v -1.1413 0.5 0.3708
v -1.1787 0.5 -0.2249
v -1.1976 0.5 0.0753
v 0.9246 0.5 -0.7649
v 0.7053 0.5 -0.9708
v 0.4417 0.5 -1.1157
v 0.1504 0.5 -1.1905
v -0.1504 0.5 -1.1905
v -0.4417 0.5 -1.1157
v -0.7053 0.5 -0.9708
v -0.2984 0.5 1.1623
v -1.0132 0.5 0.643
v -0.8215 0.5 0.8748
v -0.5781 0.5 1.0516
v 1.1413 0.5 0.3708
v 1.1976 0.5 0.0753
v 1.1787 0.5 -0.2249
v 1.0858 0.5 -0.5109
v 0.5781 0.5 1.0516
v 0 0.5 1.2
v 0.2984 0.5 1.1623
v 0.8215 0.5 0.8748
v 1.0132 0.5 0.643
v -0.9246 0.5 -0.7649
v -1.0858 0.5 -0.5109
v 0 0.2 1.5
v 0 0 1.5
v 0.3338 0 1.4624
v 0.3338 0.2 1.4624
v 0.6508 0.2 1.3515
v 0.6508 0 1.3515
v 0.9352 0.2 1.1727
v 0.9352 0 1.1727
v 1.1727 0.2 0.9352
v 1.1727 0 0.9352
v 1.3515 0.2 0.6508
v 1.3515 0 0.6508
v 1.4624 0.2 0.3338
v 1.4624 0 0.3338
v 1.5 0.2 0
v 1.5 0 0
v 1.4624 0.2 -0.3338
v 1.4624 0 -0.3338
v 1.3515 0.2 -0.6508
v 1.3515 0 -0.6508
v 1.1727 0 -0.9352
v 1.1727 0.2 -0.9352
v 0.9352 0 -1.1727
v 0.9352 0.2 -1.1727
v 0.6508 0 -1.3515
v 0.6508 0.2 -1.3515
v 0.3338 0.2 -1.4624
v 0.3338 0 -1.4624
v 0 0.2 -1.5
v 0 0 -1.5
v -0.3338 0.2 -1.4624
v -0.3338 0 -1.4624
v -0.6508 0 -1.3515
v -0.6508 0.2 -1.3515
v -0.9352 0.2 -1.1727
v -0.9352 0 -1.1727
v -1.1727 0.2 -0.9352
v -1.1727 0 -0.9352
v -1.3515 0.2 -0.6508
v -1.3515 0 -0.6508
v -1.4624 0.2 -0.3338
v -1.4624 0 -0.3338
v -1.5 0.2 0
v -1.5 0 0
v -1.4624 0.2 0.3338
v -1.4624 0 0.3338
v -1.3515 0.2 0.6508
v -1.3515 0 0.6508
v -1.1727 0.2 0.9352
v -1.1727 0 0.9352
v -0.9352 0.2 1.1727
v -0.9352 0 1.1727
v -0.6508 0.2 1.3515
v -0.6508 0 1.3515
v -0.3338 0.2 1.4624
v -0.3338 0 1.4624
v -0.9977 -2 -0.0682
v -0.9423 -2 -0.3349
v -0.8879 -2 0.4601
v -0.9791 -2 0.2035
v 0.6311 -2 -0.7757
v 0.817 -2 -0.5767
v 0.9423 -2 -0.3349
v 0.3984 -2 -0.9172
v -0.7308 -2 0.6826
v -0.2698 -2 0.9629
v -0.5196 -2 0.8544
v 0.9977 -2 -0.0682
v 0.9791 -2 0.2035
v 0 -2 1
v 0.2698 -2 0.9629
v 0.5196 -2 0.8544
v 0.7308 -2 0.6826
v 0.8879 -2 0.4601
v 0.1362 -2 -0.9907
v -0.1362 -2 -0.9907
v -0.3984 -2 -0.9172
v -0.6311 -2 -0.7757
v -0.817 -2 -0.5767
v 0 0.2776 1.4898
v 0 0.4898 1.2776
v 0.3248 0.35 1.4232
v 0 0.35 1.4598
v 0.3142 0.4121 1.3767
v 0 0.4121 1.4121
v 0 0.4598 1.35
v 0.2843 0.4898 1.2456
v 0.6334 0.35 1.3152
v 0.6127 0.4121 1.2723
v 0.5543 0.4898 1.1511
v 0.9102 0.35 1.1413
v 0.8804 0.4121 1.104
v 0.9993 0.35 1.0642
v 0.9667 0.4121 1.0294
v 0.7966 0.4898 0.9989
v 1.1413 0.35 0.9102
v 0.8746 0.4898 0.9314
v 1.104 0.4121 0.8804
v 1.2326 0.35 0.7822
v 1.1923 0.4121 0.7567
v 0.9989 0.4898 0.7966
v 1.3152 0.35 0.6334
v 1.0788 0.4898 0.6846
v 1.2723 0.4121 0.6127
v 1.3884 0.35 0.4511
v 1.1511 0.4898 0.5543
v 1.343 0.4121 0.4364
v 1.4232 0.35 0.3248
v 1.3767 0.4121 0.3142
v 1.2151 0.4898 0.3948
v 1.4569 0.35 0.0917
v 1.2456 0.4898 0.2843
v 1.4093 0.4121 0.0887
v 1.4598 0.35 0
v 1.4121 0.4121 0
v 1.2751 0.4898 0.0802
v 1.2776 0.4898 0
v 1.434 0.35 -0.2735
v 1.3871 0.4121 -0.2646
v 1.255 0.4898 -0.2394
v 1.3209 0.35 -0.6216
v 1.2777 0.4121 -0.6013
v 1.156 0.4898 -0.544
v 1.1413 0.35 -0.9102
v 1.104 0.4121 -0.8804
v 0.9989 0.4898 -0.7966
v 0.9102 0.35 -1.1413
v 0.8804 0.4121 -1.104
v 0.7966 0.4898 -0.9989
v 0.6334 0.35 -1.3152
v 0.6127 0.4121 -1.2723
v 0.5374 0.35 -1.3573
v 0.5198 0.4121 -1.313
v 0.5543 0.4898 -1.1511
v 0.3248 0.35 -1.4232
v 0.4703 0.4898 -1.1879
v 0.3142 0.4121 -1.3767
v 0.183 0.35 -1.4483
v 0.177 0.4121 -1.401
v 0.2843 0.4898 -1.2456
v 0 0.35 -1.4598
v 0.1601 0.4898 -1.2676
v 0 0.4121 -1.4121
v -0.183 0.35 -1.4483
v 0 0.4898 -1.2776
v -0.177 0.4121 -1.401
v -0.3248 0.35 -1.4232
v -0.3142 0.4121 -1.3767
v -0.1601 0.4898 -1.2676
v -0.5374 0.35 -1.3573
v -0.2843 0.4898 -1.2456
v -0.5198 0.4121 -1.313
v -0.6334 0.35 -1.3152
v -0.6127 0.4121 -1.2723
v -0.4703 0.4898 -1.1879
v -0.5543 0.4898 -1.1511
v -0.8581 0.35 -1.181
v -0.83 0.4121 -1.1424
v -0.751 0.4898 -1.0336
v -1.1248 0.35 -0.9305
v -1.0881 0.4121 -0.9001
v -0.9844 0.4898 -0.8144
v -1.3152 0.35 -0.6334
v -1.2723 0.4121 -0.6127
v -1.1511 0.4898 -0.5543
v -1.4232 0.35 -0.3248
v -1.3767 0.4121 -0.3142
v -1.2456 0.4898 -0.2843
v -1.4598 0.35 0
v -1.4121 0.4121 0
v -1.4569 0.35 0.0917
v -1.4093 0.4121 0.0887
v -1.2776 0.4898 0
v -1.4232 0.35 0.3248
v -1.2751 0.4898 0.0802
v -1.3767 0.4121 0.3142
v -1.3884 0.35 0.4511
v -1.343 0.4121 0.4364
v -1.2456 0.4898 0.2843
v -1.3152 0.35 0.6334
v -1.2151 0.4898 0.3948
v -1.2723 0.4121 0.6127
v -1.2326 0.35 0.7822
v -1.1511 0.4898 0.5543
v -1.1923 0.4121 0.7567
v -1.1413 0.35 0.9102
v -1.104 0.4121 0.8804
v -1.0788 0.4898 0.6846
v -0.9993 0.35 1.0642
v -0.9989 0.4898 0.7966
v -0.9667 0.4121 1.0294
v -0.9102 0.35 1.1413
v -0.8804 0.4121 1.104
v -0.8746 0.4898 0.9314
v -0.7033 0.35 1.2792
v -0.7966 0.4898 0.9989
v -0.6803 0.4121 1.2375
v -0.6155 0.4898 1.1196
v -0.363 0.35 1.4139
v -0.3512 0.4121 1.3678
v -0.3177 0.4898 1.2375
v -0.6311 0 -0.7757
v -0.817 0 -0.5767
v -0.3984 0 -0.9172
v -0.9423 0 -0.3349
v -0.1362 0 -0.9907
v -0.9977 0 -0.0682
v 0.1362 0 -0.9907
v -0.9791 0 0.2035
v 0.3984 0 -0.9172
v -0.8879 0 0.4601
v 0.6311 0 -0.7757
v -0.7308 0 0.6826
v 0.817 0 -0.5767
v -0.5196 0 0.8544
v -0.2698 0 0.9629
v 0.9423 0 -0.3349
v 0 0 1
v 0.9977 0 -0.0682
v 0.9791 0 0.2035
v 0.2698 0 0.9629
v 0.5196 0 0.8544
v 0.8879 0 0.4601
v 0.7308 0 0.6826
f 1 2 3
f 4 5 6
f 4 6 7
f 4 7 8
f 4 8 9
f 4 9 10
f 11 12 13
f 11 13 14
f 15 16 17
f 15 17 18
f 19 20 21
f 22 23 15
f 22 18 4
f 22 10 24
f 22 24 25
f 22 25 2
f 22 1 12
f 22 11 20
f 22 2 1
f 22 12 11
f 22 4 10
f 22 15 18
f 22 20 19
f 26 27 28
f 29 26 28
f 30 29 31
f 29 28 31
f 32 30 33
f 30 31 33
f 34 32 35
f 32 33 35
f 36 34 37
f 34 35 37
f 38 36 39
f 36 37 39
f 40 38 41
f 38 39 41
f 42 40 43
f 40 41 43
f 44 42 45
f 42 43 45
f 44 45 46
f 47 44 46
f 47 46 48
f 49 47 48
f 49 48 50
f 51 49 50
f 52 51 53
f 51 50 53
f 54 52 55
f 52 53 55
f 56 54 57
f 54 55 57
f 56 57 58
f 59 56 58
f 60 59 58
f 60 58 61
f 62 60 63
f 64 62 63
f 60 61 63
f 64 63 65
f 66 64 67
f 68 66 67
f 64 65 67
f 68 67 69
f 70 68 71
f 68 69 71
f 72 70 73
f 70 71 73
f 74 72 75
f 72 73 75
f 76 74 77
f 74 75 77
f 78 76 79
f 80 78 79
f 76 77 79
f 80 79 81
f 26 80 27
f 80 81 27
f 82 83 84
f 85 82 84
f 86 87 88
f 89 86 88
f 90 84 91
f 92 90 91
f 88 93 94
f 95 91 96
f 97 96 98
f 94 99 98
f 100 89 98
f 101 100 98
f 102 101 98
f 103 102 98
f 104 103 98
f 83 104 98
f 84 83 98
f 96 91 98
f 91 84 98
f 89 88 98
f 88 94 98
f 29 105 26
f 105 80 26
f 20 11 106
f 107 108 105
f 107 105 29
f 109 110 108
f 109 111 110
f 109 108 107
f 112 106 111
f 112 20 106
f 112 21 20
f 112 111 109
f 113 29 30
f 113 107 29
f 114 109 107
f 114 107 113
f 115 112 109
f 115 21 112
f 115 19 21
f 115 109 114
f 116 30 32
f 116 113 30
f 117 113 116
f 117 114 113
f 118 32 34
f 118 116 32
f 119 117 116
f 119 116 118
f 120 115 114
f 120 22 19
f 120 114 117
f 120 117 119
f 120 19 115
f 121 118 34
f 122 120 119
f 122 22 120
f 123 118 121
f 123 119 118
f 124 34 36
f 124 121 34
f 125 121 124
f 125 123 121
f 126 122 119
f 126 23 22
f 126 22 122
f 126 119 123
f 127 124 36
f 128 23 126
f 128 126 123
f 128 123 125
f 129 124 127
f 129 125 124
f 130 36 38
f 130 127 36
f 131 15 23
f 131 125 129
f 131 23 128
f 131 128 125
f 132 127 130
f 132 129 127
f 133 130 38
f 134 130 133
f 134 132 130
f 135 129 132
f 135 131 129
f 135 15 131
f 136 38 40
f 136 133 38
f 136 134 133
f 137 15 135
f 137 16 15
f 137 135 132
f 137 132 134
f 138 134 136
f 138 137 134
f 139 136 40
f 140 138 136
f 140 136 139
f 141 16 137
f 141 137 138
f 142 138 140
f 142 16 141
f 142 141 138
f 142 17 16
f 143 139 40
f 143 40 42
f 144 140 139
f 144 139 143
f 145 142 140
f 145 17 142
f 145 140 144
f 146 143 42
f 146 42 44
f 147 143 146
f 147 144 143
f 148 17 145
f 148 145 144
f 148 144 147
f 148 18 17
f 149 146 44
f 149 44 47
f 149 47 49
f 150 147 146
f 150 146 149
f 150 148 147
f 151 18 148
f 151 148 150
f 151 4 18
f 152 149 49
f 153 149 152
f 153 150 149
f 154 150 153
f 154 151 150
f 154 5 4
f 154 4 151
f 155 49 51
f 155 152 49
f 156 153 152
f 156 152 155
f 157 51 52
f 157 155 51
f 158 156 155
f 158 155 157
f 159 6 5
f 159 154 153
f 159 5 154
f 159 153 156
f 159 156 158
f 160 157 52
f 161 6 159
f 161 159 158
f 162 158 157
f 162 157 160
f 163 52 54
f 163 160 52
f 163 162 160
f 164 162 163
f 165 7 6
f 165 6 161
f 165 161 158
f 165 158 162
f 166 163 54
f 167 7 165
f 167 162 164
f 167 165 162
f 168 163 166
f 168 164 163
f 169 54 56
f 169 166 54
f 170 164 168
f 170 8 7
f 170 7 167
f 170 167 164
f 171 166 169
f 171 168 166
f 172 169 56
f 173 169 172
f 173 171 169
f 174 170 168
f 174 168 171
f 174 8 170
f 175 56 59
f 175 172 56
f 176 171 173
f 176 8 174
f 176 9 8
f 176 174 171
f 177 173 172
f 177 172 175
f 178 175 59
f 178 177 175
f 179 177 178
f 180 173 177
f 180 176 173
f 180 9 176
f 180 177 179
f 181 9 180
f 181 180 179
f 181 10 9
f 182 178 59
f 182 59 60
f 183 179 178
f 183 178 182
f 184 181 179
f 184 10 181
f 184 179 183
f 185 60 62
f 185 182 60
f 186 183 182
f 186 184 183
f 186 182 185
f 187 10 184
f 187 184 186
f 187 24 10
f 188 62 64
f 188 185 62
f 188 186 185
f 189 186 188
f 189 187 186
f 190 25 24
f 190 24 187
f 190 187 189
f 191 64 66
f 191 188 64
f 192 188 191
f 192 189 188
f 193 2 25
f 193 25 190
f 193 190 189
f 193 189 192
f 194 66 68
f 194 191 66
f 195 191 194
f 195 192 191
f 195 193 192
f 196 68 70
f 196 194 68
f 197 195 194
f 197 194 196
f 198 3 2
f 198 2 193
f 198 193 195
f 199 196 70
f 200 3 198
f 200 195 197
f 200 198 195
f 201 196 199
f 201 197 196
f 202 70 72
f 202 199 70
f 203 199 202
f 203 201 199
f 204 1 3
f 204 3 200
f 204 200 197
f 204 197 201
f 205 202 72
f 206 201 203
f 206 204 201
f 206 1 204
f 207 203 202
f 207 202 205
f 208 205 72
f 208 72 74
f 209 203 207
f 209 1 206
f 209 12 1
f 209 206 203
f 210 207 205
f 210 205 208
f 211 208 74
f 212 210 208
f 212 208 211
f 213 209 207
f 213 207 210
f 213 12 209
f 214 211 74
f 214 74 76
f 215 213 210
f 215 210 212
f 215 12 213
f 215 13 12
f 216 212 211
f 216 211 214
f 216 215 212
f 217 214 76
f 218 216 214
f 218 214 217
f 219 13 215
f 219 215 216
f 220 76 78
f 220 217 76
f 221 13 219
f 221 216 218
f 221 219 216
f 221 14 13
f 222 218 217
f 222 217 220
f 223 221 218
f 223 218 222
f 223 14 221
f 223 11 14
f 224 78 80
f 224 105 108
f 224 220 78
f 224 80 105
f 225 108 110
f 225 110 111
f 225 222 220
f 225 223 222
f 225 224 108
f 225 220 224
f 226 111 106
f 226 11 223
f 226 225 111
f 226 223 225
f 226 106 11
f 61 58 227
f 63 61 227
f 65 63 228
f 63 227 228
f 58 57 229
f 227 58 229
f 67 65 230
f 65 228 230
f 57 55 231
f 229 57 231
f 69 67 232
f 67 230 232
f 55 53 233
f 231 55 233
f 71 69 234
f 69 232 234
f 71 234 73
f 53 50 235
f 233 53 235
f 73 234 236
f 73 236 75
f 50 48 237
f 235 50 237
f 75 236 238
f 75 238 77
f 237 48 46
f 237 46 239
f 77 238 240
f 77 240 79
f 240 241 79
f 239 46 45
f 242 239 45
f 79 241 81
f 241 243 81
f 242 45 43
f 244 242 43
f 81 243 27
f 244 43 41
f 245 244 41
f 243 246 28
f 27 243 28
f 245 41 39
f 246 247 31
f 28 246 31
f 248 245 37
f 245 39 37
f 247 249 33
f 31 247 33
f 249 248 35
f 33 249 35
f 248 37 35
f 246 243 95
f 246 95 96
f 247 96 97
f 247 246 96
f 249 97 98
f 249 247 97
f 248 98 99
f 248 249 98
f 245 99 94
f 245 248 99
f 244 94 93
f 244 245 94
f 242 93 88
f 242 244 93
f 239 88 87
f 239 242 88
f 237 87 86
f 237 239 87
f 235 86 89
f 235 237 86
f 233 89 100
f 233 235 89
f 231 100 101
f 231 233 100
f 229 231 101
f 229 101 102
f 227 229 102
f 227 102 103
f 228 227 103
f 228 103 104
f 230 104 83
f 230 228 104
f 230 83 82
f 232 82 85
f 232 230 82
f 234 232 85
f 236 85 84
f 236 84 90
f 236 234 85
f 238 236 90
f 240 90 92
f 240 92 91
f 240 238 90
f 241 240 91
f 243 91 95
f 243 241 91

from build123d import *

# Parameters (mm, degrees)
SKETCH1_R           = 1.5
BOSS_EXTRUDE1_DEPTH = 0.5
SKETCH1_3_R         = 1
BOSS_EXTRUDE2_DEPTH = 2
FILLET1_R           = 0.3


with BuildPart() as part:
    # Sketch1 → Boss-Extrude1 (new body)
    with BuildSketch(Plane(origin=(0, 0, 0), x_dir=(1, 0, 0), z_dir=(0, 1, 0))):
        Circle(SKETCH1_R)
    extrude(amount=BOSS_EXTRUDE1_DEPTH)

    # Sketch1<3> → Boss-Extrude2 (add)
    with BuildSketch(Plane(origin=(0, 0, 0), x_dir=(1, 0, 0), z_dir=(0, 1, 0))):
        Circle(SKETCH1_3_R)
    extrude(amount=-BOSS_EXTRUDE2_DEPTH)

    # Fillet1
    fillet1_edges = [part.edges().sort_by_distance(p)[0] for p in [
        (-1.5, 0.5, 0),
    ]]
    fillet(fillet1_edges, radius=FILLET1_R)


solid = part.part
